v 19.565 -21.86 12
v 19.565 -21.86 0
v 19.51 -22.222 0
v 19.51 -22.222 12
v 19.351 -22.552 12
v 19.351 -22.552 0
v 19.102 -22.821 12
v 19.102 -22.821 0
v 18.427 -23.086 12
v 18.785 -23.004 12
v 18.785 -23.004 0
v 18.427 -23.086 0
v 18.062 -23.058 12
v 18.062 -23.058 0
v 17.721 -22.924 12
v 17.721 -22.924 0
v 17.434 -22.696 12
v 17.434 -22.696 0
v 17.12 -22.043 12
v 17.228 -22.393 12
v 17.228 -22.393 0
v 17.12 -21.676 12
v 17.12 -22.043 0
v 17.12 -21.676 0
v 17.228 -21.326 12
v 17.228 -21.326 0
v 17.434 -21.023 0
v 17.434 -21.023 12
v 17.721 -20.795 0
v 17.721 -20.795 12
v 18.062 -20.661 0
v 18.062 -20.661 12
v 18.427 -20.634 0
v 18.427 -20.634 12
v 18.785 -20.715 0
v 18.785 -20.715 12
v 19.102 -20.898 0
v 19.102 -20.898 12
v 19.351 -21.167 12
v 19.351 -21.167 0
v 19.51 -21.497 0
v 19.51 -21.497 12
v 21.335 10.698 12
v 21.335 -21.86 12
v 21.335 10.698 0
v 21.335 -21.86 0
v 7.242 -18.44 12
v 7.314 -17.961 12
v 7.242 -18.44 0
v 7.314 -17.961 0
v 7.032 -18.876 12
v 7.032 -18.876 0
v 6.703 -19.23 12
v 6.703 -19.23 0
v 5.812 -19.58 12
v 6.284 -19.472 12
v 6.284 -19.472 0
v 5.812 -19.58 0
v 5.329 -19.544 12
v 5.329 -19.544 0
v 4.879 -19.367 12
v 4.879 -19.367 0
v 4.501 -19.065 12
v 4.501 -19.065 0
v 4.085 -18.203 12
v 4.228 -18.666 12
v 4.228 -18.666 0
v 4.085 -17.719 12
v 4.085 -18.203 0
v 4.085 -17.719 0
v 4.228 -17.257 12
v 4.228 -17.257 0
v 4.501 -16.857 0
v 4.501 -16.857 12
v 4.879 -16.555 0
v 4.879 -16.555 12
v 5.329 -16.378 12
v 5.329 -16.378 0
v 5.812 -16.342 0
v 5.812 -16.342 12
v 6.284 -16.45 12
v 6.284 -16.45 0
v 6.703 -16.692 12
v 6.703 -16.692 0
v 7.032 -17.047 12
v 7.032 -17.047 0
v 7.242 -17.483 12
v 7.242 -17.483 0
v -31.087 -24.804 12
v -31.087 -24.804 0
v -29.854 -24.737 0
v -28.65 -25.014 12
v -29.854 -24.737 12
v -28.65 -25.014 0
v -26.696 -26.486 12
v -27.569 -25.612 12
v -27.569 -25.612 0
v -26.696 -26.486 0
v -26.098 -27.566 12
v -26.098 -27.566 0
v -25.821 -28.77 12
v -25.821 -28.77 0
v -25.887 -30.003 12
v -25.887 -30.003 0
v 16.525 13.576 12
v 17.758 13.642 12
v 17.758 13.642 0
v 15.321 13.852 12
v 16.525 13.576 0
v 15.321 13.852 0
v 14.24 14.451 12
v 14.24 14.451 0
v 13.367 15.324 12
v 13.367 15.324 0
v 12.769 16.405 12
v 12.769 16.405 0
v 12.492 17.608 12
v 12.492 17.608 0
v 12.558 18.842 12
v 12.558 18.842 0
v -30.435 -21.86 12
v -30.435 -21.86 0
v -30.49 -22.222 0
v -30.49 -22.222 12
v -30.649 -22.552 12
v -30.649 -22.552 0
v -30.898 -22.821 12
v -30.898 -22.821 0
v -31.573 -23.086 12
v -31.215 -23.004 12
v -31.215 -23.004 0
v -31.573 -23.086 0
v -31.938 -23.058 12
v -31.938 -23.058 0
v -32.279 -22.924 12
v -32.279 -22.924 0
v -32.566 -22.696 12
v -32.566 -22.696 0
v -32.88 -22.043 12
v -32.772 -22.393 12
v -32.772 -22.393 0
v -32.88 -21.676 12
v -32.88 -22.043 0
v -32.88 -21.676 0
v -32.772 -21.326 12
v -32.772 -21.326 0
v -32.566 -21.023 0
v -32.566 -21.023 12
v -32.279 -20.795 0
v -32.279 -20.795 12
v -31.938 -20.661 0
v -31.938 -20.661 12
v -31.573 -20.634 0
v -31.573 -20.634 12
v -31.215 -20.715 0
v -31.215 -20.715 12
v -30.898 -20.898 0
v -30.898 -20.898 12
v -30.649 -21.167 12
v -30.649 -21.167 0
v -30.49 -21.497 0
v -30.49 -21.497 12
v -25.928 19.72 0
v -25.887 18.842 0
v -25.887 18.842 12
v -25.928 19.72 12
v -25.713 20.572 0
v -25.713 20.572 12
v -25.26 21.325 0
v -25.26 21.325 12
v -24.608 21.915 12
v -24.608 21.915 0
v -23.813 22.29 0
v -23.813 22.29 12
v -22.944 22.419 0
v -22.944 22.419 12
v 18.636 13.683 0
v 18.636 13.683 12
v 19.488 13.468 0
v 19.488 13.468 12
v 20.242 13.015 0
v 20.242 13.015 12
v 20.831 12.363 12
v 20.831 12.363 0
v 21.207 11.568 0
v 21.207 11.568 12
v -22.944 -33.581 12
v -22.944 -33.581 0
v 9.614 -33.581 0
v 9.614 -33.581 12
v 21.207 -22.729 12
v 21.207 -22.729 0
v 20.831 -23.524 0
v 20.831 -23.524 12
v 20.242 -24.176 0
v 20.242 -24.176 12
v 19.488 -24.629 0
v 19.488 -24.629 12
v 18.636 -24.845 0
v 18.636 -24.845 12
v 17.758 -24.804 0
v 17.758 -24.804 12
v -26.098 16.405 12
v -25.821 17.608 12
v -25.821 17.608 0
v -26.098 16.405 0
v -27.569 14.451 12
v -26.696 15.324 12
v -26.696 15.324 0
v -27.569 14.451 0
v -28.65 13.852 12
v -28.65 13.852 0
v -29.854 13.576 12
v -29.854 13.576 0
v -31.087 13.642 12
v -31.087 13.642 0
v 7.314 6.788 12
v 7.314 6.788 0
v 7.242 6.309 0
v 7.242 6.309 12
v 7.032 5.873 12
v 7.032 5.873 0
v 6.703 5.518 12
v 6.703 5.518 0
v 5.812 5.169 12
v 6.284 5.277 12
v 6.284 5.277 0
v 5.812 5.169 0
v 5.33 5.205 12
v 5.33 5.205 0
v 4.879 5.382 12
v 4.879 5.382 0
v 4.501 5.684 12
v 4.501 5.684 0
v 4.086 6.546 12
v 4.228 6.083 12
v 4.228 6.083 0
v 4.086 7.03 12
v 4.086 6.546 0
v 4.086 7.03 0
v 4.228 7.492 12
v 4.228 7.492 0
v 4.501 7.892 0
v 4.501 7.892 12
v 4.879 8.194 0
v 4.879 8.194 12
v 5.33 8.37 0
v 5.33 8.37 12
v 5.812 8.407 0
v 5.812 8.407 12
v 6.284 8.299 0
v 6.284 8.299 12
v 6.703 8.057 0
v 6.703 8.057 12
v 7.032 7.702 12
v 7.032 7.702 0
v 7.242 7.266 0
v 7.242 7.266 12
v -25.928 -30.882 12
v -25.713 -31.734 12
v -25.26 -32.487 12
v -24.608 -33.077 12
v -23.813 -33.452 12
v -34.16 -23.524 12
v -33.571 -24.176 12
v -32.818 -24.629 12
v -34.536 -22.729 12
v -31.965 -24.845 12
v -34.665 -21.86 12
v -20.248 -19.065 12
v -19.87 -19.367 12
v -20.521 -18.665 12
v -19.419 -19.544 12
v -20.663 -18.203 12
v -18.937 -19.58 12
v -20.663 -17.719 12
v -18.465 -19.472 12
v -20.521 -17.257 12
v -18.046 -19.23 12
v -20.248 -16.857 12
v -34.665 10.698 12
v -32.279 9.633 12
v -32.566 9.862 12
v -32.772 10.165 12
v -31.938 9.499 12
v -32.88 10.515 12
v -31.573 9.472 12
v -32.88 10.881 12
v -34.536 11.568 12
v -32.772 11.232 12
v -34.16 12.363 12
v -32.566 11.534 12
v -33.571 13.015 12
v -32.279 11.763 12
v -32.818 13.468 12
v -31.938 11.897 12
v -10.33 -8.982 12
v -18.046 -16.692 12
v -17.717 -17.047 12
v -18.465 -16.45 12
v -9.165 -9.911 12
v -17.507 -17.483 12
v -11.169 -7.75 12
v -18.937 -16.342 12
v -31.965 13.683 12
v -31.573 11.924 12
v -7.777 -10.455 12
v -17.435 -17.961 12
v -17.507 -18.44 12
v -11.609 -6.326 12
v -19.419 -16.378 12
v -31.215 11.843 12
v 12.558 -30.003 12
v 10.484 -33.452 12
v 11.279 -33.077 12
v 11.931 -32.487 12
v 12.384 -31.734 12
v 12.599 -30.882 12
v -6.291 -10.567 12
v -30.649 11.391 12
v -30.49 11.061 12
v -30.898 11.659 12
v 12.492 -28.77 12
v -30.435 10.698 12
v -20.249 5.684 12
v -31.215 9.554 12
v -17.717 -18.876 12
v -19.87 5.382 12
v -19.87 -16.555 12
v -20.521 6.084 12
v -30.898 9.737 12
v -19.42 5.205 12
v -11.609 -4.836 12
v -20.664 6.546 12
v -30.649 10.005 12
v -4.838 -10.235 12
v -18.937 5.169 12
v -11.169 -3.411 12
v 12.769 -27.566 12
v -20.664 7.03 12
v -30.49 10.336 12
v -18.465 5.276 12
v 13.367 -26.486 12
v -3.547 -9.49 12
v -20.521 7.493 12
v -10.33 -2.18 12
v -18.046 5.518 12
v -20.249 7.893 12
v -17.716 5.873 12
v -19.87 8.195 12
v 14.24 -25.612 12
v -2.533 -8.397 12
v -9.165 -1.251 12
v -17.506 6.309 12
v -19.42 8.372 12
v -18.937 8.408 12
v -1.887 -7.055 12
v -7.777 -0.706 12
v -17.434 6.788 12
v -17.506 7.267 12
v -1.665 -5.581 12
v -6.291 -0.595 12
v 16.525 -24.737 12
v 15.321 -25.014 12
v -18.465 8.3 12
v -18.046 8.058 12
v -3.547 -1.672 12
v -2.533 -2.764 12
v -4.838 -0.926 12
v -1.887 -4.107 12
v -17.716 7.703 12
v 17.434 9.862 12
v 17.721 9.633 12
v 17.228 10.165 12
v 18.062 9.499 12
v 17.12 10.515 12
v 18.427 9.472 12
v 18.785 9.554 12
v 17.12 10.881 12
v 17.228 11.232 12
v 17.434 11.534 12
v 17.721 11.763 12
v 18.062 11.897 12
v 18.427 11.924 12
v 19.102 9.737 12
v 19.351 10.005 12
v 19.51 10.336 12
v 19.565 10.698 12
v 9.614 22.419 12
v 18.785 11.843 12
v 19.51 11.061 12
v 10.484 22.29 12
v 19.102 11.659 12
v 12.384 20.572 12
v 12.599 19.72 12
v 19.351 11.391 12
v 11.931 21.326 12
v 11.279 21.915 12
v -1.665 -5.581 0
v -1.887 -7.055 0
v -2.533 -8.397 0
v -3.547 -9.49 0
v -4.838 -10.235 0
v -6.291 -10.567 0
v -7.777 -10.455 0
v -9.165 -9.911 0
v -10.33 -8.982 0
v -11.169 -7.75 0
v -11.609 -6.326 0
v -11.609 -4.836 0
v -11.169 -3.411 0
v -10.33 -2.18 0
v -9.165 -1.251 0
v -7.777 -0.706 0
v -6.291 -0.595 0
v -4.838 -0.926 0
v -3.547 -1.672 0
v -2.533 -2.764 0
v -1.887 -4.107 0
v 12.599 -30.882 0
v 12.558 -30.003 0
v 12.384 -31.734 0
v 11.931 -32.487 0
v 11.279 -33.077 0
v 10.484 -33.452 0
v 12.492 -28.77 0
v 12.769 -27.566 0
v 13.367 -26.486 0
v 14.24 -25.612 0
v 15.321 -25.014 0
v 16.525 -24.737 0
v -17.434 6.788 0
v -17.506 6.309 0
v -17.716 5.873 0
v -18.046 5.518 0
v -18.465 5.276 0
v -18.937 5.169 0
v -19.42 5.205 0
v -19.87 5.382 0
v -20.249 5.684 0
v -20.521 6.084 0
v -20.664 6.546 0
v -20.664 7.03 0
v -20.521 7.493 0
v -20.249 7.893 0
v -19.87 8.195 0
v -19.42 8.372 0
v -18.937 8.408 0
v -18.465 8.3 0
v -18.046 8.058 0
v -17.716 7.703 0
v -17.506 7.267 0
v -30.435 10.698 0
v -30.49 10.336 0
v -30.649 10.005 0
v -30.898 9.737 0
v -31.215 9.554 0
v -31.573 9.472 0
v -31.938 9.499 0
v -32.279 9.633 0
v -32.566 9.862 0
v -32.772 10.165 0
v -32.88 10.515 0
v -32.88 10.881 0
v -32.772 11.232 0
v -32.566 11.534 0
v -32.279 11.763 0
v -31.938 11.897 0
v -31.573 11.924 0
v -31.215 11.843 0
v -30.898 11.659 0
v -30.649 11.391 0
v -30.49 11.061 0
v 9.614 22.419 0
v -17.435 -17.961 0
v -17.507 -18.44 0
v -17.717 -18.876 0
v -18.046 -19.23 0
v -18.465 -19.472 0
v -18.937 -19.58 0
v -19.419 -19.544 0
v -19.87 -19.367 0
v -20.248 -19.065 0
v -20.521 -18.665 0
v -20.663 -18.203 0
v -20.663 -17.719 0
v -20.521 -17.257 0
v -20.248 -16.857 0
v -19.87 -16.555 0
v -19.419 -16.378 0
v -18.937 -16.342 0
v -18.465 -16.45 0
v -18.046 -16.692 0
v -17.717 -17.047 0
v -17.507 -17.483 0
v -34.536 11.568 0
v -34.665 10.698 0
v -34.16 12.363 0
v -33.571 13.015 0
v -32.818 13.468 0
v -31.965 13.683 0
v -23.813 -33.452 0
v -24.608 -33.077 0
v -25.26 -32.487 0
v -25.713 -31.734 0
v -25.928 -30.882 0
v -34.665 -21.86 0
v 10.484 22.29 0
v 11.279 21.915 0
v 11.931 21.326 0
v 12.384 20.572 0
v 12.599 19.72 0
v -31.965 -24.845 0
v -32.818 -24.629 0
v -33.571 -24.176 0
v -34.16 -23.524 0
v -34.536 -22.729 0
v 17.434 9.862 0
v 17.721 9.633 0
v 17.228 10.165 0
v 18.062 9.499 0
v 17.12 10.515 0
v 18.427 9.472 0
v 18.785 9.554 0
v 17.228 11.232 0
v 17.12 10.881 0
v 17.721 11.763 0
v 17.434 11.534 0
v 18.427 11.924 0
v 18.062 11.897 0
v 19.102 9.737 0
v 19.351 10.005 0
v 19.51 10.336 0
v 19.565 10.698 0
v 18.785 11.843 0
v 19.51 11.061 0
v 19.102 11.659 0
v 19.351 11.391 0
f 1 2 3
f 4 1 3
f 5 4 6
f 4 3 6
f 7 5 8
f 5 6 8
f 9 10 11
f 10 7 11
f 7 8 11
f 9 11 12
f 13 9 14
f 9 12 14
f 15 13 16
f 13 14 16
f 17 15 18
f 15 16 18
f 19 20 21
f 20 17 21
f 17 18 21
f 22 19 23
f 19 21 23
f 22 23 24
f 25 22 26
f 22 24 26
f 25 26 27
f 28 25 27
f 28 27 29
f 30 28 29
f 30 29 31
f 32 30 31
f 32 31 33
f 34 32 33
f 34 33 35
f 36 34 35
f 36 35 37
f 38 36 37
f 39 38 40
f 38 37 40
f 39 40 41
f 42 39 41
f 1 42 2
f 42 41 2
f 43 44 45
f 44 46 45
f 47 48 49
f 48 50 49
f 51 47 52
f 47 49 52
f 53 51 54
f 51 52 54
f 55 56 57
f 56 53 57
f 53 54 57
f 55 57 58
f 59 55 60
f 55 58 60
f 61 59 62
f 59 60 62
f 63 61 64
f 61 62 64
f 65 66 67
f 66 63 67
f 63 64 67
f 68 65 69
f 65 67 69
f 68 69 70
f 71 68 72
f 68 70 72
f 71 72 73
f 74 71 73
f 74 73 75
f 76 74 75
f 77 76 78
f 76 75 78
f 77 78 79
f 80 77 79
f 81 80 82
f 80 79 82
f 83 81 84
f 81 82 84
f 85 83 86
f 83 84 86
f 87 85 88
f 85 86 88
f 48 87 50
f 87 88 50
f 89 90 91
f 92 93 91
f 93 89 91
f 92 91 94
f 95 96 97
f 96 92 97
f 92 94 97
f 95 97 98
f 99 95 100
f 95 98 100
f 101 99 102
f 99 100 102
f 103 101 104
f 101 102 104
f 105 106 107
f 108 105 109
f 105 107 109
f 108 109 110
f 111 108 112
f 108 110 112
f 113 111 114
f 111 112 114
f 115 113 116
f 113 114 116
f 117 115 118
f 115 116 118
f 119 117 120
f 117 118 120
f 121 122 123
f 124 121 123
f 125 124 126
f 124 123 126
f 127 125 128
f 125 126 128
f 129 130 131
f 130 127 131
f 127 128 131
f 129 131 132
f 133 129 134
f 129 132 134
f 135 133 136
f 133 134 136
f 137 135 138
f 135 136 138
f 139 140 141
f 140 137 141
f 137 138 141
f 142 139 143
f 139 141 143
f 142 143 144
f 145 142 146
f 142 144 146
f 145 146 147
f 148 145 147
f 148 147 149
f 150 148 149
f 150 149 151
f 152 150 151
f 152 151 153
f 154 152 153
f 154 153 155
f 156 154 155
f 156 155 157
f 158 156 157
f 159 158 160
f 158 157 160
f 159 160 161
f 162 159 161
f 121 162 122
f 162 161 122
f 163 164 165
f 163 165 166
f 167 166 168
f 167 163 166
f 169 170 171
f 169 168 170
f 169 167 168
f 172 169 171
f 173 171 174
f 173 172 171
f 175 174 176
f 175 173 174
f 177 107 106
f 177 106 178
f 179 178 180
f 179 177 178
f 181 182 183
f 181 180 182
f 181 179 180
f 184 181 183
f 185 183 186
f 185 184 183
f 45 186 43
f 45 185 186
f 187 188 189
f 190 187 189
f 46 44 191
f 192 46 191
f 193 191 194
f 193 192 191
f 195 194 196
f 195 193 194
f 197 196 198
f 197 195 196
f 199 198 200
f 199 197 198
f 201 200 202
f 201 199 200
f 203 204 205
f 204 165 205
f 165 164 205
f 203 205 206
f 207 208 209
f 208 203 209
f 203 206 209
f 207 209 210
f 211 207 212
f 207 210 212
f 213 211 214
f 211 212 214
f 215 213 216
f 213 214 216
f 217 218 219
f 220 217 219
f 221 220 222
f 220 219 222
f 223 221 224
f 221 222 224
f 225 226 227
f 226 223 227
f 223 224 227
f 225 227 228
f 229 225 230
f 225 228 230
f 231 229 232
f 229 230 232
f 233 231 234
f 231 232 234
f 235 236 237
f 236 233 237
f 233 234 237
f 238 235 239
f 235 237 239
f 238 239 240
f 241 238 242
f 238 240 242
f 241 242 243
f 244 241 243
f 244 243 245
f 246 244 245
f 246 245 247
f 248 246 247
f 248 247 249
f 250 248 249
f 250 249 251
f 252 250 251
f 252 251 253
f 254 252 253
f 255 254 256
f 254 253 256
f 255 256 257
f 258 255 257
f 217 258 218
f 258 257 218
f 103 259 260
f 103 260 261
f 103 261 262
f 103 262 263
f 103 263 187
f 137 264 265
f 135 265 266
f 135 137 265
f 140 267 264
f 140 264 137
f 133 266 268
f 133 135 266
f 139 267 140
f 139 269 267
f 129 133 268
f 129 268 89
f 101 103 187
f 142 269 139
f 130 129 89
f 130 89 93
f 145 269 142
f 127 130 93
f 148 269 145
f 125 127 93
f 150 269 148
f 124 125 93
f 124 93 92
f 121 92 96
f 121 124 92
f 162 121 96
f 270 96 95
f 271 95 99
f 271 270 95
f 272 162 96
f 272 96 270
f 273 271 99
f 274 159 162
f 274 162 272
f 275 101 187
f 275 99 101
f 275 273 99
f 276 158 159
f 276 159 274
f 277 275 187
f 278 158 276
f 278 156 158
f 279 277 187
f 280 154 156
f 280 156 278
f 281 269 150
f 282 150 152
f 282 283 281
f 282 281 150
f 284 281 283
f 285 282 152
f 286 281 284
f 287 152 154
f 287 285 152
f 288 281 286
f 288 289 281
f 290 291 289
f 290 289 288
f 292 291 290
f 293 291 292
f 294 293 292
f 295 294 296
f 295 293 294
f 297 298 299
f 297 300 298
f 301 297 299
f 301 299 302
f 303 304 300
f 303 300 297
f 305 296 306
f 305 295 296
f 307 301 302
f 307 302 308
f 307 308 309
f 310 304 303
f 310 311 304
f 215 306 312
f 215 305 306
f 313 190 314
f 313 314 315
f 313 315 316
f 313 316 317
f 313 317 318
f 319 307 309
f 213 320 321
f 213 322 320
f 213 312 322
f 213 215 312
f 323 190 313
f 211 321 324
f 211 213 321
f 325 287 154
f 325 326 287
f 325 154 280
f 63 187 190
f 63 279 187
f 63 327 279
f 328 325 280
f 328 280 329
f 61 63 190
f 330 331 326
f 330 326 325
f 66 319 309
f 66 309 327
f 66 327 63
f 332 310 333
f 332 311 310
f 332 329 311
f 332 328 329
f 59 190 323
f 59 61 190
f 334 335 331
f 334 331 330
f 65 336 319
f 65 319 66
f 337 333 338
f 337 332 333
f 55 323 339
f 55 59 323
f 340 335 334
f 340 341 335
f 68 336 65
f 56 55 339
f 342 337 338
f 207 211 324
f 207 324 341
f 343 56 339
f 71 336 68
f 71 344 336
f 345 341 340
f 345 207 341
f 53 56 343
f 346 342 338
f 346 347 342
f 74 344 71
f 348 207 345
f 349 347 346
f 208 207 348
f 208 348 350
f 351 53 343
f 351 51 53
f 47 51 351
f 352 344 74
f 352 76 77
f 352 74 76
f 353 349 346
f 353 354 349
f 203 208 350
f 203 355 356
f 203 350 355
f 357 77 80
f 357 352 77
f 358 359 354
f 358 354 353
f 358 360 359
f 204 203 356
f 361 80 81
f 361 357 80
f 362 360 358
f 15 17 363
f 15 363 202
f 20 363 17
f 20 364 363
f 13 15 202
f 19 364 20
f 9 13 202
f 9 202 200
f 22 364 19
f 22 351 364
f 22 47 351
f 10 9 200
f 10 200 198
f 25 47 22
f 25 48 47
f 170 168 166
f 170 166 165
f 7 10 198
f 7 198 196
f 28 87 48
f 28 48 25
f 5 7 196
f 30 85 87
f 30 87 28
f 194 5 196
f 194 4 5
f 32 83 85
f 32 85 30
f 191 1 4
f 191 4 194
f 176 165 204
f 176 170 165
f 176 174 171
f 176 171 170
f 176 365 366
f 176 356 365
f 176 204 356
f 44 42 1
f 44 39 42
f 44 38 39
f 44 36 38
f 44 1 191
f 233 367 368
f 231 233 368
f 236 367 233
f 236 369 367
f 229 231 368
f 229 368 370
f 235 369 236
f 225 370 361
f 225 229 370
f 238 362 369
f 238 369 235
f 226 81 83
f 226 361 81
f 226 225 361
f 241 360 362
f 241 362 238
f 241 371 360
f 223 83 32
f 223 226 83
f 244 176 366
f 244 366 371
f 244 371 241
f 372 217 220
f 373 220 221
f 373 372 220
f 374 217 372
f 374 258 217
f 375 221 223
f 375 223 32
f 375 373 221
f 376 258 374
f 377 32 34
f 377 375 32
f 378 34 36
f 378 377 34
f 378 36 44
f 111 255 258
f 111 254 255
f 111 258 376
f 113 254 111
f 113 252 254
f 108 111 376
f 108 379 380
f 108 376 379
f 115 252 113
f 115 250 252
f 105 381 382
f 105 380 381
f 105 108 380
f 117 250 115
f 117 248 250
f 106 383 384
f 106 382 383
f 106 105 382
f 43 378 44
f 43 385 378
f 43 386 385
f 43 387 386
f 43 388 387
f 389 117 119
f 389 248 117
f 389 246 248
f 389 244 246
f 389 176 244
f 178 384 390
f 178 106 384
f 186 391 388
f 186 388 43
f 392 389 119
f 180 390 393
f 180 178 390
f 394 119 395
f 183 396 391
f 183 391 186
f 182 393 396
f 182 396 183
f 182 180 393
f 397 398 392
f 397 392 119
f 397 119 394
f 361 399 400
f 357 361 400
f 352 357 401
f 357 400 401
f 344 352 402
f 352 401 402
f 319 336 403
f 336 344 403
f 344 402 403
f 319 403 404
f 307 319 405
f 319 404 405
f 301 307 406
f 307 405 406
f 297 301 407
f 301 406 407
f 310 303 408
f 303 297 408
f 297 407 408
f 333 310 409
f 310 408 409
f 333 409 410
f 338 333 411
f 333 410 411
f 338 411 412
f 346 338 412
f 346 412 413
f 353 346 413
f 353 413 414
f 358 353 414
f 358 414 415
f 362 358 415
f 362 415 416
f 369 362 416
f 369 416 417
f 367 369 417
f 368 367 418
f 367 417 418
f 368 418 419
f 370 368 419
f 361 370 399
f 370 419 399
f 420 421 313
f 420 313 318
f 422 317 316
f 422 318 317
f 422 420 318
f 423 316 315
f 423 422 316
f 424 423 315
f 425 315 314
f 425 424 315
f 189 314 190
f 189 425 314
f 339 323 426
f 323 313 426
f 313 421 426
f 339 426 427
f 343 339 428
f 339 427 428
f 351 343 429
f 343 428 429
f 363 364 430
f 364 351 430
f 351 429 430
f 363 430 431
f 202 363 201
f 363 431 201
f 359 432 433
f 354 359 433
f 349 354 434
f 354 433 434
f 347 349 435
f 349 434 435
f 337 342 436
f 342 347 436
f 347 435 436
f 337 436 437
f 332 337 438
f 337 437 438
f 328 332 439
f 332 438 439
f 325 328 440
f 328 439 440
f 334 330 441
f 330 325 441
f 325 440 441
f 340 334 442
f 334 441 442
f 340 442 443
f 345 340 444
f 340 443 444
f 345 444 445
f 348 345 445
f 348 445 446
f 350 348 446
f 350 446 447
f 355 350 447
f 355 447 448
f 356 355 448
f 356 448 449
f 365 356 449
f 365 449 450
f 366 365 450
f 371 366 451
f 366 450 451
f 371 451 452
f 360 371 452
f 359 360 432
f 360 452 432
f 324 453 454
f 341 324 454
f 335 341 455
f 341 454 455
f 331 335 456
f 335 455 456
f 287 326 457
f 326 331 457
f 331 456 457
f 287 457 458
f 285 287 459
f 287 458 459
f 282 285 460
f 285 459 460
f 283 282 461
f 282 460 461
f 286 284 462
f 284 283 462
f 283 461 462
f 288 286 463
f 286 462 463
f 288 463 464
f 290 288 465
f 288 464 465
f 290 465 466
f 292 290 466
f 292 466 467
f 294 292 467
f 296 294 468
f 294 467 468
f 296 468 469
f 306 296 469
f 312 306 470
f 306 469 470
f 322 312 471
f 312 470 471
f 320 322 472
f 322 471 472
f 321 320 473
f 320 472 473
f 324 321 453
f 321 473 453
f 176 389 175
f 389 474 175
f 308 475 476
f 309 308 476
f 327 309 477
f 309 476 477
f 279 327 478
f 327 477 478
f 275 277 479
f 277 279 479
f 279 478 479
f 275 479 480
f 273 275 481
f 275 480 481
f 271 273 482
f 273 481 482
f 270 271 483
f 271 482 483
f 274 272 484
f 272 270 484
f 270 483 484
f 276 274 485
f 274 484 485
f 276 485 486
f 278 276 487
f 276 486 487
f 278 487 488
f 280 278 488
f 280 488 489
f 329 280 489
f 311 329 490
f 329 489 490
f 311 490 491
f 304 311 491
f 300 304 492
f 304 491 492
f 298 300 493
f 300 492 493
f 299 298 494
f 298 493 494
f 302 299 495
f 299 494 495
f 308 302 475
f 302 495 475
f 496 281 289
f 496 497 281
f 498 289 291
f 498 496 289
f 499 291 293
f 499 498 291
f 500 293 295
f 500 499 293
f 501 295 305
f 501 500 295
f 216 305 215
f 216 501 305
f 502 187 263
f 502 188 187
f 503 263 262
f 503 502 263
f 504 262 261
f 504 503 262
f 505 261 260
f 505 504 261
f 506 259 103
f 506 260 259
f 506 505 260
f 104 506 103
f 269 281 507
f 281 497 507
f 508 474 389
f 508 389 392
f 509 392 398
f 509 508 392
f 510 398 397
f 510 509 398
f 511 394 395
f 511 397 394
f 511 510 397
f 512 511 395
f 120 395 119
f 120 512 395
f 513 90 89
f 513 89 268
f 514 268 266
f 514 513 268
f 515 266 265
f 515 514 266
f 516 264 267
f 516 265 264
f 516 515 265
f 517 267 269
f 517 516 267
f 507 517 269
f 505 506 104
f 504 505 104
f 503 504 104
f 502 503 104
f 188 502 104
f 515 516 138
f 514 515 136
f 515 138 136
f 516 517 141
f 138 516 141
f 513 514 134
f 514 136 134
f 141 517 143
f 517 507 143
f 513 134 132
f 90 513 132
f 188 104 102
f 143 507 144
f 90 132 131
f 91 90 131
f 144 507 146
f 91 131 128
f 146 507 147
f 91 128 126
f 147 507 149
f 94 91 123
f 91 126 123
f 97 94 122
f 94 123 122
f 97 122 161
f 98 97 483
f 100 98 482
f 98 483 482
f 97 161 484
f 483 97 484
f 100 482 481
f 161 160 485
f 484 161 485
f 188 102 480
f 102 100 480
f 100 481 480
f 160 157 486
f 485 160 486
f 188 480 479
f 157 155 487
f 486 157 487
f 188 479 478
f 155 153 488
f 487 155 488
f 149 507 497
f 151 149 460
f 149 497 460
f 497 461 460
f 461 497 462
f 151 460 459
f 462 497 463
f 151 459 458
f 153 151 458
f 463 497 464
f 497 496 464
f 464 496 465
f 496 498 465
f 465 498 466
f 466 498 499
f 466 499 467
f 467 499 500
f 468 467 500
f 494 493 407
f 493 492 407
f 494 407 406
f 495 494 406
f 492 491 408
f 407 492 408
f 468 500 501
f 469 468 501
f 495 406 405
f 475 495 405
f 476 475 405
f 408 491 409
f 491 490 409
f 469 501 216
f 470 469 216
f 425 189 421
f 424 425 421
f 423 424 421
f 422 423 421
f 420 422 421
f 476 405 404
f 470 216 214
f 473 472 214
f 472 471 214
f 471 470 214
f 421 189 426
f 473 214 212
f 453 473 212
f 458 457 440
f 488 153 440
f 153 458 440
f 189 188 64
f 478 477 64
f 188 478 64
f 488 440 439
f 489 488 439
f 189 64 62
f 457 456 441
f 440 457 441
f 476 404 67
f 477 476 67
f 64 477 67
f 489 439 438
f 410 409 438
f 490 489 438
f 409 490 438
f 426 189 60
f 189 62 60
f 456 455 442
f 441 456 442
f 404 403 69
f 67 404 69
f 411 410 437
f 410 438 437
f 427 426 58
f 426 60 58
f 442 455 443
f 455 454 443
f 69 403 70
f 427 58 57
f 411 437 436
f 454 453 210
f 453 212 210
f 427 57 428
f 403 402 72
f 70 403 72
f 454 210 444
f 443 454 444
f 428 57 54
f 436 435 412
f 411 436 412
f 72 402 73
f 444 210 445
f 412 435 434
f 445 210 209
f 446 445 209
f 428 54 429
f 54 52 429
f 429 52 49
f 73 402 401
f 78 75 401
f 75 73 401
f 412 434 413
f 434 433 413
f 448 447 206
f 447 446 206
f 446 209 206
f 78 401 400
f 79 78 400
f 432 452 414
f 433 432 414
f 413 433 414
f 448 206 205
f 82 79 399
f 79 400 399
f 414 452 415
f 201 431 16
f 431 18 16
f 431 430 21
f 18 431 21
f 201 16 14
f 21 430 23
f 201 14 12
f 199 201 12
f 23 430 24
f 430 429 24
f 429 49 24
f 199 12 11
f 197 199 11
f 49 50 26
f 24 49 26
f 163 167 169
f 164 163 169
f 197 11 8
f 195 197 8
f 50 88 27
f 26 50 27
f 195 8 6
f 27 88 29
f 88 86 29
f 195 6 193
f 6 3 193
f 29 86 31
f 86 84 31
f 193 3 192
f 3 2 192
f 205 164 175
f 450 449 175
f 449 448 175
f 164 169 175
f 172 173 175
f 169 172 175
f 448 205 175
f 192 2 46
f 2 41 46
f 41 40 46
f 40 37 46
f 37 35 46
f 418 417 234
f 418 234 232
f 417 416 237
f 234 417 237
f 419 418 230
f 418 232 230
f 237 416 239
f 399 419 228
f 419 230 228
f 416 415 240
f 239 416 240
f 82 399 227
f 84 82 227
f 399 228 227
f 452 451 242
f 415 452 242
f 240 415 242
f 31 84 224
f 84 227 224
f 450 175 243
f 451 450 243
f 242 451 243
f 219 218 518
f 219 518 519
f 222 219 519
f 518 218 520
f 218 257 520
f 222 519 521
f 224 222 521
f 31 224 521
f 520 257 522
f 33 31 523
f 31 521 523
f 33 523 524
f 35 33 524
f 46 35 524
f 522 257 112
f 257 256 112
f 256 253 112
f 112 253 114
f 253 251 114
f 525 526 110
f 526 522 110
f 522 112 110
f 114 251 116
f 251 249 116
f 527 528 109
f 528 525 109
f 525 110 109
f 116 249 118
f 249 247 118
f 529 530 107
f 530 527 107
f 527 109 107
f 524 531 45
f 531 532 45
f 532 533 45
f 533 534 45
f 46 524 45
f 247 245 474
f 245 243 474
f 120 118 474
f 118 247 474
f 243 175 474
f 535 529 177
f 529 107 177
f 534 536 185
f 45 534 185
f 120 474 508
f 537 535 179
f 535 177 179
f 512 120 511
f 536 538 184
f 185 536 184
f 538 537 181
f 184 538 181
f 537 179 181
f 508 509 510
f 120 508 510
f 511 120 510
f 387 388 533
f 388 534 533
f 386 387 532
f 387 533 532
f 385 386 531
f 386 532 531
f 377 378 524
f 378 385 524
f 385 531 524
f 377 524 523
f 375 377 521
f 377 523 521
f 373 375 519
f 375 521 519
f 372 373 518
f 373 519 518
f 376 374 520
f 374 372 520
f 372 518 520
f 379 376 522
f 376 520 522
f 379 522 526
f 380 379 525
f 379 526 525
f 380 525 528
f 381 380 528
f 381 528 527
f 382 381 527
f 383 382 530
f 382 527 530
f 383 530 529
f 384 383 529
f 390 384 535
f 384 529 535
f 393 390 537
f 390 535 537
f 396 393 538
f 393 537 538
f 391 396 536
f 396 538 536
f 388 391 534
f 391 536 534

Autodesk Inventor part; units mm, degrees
ref_plane "YZ Plane" through (0, 0, 0) normal (1, 0, 0) x (0, 1, 0)
ref_plane "XZ Plane" through (0, 0, 0) normal (0, 1, 0) x (-1, 0, 0)
ref_plane "XY Plane" through (0, 0, 0) normal (0, 0, 1) x (1, 0, 0)
sketch "Base" plane through (0, 0, 0) normal (0, 0, 1) x (1, 0, 0)
  circle A0 centre (18.3354, -21.8597) radius 1.2295
  circle A1 centre (-31.6646, -21.8597) radius 1.2295
  circle A2 centre (18.3354, 10.6981) radius 1.2295
  circle A3 centre (-31.6646, 10.6981) radius 1.2295
  circle A4 centre (-6.6646, -5.5808) radius 5
  arc A5 (21.3354, 10.6981) -> (17.758, 13.642) centre (18.3354, 10.6981) ccw
  arc A6 (12.5583, 18.8418) -> (17.758, 13.642) centre (16.9054, 17.9892) ccw
  arc A7 (12.5583, 18.8418) -> (9.6143, 22.4192) centre (9.6143, 19.4192) ccw
  line L0 (9.6143, 22.4192) -> (-22.9435, 22.4192)
  arc A8 (-22.9435, 22.4192) -> (-25.8874, 18.8418) centre (-22.9435, 19.4192) ccw
  arc A9 (-31.0872, 13.642) -> (-25.8874, 18.8418) centre (-30.2346, 17.9892) ccw
  arc A10 (-31.0872, 13.642) -> (-34.6646, 10.6981) centre (-31.6646, 10.6981) ccw
  line L1 (-34.6646, 10.6981) -> (-34.6646, -21.8597)
  arc A11 (-34.6646, -21.8597) -> (-31.0872, -24.8036) centre (-31.6646, -21.8597) ccw
  arc A12 (-25.8874, -30.0034) -> (-31.0872, -24.8036) centre (-30.2346, -29.1508) ccw
  arc A13 (-25.8874, -30.0034) -> (-22.9435, -33.5808) centre (-22.9435, -30.5808) ccw
  line L2 (-22.9435, -33.5808) -> (9.6143, -33.5808)
  arc A14 (9.6143, -33.5808) -> (12.5583, -30.0034) centre (9.6143, -30.5808) ccw
  arc A15 (17.758, -24.8036) -> (12.5583, -30.0034) centre (16.9054, -29.1508) ccw
  arc A16 (17.758, -24.8036) -> (21.3354, -21.8597) centre (18.3354, -21.8597) ccw
  line L3 (21.3354, -21.8597) -> (21.3354, 10.6981)
  circle A17 centre (-19.0581, -17.9611) radius 1.6234
  circle A18 centre (-19.0582, 6.7882) radius 1.6241
  circle A19 centre (5.6908, 6.7877) radius 1.6234
  circle A20 centre (5.6907, -17.9611) radius 1.6235
  point P0 (0, 0)
extrude "Plate1" add sketch "Base" along normal blind 12
equation "\"d0\" = Thickness"
equation "\"BendRadius\" = Thickness"
equation "\"BendReliefWidth\" = Thickness"
equation "\"BendReliefDepth\" = 0.5 * Thickness"
equation "\"CornerReliefSize\" = 4 * Thickness"
equation "\"MinimumRemnant\" = 2 * Thickness"
equation "\"TransitionRadius\" = BendRadius"
equation "\"JacobiRadiusSize\" = BendRadius"
equation "\"GapSize\" = Thickness"
equation "\"Thickness\" = 12"
properties part number "NeckEncoderMount"
